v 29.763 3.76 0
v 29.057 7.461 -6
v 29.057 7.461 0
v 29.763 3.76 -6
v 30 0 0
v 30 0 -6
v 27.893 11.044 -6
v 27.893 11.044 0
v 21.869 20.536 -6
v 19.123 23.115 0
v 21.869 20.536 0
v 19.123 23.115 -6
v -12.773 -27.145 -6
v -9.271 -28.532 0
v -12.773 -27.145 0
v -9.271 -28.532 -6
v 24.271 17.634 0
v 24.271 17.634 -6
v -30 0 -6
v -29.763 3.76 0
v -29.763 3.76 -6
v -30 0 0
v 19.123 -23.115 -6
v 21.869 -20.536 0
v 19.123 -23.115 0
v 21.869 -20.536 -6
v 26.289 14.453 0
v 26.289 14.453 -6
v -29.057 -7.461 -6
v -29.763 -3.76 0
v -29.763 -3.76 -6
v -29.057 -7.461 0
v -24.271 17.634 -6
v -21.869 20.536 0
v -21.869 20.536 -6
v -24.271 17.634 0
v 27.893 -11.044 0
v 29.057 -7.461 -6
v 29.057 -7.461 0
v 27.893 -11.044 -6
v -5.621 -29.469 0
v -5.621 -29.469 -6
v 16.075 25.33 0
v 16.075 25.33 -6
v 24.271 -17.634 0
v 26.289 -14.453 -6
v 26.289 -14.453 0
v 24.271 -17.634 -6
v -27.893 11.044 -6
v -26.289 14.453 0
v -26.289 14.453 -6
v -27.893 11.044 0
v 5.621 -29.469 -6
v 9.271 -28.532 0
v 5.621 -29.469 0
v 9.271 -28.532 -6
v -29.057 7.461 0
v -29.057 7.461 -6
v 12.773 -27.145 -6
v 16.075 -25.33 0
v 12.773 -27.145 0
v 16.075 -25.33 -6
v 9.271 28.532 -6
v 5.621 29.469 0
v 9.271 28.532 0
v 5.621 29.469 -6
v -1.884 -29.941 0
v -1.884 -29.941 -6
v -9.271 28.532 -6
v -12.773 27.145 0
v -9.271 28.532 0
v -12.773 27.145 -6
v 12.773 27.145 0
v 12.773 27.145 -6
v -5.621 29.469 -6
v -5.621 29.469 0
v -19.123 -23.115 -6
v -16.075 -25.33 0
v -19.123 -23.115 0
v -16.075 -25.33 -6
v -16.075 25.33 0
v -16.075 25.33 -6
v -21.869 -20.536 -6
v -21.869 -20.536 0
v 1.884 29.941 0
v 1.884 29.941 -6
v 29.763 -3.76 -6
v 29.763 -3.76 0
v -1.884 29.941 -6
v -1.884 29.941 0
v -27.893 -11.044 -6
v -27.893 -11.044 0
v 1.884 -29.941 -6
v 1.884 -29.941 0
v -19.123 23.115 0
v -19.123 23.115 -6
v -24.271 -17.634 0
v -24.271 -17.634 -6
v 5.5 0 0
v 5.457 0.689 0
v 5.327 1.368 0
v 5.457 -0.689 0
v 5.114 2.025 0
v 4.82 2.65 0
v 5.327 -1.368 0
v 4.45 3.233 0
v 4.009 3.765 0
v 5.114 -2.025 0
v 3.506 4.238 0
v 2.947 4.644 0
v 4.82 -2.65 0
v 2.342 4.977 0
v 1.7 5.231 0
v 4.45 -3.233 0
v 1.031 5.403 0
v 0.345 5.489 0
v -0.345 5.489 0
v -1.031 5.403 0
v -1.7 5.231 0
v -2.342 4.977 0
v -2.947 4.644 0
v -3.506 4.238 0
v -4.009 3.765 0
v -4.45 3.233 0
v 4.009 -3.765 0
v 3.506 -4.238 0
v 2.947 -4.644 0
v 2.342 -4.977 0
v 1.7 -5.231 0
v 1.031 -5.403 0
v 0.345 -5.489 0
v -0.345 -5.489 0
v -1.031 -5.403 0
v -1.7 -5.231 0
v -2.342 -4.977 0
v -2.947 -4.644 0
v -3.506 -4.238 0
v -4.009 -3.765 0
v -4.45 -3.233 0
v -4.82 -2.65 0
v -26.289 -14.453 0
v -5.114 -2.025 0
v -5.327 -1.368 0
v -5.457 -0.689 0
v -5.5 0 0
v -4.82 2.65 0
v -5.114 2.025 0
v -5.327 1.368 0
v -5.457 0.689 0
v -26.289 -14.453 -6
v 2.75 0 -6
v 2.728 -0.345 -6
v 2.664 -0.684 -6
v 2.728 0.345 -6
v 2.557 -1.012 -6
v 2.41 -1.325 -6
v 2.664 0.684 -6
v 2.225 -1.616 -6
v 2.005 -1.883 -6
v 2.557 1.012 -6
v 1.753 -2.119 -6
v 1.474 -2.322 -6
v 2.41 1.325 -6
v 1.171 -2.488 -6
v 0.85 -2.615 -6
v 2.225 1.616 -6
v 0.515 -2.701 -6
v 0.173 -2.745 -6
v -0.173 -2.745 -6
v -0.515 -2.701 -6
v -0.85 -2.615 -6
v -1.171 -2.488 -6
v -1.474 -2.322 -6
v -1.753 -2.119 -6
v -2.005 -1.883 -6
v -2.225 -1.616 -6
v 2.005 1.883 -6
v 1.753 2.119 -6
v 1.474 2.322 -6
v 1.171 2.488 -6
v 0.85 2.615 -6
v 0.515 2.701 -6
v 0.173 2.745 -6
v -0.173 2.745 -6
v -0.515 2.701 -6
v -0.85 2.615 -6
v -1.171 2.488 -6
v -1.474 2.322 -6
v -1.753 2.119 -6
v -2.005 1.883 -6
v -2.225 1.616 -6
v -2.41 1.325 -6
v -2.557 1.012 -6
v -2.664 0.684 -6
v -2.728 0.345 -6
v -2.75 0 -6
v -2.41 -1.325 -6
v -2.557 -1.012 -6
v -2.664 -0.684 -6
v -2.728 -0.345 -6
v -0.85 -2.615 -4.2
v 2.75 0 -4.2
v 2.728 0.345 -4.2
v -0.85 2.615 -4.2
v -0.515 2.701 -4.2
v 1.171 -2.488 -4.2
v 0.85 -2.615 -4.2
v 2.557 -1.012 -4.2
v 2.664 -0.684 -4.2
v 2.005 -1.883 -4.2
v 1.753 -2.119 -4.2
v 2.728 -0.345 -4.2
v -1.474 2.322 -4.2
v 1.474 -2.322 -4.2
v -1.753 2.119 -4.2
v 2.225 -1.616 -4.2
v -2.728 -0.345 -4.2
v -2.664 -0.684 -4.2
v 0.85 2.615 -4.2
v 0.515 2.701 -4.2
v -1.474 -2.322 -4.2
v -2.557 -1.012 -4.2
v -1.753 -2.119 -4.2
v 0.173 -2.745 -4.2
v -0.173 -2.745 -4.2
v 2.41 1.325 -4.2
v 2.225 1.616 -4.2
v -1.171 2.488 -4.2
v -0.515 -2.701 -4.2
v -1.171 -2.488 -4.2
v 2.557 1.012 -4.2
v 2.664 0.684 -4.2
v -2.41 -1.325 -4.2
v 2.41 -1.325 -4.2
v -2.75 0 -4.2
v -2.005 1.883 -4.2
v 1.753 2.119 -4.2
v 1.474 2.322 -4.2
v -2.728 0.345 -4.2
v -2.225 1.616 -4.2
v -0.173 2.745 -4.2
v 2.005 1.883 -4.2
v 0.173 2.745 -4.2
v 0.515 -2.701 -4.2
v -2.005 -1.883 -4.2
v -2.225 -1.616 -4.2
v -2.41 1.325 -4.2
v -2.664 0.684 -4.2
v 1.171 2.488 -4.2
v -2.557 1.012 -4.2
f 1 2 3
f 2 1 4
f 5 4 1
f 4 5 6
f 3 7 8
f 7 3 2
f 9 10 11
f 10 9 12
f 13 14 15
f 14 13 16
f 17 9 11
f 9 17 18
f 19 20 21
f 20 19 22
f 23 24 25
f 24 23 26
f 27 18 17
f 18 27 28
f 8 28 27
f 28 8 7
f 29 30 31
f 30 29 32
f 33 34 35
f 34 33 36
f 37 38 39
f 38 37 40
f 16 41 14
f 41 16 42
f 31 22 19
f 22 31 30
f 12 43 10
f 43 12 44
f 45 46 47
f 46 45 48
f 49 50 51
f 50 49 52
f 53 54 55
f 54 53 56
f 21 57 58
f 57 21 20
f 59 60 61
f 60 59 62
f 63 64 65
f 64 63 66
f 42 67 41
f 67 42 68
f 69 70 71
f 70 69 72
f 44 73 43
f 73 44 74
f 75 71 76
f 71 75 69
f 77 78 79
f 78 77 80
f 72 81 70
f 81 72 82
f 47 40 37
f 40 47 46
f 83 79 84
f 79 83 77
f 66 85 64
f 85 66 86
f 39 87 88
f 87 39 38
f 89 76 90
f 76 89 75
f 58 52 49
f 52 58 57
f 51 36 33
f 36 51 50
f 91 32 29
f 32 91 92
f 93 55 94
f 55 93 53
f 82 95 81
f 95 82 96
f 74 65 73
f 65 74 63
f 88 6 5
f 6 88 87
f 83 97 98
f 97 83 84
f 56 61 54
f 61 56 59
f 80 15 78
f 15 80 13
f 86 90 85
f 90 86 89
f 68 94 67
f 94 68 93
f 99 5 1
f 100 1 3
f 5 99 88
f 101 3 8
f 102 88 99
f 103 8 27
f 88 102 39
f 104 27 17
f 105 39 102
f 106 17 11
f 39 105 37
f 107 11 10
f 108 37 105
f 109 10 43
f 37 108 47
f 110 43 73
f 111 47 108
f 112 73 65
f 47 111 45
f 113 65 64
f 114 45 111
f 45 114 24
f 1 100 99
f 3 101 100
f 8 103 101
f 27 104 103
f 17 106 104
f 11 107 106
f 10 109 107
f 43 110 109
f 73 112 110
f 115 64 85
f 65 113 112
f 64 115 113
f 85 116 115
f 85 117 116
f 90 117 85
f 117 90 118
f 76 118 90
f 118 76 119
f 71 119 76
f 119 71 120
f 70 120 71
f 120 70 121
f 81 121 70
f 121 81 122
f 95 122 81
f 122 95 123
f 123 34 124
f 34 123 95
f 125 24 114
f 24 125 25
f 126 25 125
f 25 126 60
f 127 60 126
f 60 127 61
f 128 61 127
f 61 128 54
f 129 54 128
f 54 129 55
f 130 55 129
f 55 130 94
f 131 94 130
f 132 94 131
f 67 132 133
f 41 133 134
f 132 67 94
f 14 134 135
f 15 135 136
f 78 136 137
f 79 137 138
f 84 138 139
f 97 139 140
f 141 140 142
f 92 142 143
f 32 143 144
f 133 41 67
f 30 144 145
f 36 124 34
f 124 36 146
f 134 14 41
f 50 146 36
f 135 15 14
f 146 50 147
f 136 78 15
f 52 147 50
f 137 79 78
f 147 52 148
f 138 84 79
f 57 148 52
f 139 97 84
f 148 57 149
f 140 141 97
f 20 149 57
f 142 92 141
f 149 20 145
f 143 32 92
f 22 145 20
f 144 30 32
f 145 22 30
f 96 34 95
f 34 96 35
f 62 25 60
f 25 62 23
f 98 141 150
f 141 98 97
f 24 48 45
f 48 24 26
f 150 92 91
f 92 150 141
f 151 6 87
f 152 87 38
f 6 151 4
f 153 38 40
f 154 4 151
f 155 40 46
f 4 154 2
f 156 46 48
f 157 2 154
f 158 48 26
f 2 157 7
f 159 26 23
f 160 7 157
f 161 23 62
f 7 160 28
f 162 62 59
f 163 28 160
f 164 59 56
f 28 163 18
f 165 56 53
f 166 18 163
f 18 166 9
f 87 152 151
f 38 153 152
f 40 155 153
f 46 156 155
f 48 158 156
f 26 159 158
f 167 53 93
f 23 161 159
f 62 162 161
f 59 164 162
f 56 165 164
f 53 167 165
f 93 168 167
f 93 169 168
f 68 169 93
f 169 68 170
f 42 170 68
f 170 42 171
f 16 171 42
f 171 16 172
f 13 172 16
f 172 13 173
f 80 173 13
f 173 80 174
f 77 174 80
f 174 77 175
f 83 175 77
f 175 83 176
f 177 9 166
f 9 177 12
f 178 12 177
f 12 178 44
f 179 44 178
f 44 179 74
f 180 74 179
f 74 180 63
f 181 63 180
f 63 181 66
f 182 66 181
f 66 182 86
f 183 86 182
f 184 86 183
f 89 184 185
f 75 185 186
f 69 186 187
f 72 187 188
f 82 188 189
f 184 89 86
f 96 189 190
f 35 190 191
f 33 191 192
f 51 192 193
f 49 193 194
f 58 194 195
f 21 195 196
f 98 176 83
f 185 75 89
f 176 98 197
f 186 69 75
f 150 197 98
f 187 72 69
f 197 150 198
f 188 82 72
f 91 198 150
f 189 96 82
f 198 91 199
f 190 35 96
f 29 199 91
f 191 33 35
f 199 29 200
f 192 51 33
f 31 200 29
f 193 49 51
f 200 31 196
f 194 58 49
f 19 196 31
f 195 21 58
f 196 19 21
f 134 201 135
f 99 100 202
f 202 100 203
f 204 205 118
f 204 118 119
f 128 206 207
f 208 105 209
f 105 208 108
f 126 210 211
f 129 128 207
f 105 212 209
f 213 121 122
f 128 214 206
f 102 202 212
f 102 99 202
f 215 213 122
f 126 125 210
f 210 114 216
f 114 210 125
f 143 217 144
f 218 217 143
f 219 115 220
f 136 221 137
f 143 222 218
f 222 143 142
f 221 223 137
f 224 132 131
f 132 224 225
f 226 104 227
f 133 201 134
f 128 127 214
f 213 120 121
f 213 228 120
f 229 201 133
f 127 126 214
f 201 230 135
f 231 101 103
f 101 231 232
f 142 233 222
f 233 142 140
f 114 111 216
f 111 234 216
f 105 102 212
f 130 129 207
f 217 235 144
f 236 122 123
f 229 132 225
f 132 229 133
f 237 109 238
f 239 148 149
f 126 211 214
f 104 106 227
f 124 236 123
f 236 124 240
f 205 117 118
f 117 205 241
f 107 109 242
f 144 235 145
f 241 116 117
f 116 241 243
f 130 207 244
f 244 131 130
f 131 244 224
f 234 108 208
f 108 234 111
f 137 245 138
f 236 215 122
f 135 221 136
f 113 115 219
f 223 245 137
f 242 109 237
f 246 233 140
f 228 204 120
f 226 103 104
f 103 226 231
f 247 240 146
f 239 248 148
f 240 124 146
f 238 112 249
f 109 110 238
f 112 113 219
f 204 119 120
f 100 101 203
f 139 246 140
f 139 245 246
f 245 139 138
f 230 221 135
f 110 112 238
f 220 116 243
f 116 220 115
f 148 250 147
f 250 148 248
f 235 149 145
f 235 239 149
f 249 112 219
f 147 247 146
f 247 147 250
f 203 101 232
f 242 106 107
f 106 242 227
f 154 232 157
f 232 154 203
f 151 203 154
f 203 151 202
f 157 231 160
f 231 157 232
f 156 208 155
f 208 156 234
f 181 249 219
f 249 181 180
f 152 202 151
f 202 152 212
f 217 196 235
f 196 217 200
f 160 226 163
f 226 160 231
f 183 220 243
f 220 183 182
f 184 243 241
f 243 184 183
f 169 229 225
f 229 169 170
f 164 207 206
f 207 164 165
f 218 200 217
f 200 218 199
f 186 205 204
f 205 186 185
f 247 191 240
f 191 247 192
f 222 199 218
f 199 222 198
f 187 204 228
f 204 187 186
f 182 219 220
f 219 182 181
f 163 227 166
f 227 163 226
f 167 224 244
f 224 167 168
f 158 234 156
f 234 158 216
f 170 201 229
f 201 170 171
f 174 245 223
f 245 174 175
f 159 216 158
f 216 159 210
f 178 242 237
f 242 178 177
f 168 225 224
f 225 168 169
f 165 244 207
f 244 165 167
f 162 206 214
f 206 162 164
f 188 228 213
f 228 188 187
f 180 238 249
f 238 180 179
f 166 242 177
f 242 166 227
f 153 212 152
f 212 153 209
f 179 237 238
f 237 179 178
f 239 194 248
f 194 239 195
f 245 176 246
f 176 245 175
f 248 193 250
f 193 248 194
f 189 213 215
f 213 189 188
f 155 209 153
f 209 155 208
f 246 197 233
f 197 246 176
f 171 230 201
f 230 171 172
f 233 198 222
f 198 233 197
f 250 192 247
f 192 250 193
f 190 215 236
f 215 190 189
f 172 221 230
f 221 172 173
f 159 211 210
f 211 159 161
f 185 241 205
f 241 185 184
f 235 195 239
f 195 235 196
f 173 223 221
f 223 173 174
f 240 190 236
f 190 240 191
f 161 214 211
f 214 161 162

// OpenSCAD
$fn = 50;


difference() {
	union() {
		translate(v = [0, 0, -6.0000000000]) {
			cylinder(h = 6, r = 30.0000000000);
		}
		translate(v = [0, 0, -6.0000000000]) {
			cylinder(h = 6, r = 2.8750000000);
		}
	}
	union() {
		translate(v = [0, 0, 0]) {
			rotate(a = [0, 0, 0]) {
				difference() {
					union() {
						translate(v = [0, 0, -6.0000000000]) {
							cylinder(h = 6, r = 2.2500000000);
						}
						translate(v = [0, 0, -4.2000000000]) {
							cylinder(h = 4.2000000000, r1 = 2.7500000000, r2 = 5.5000000000);
						}
						translate(v = [0, 0, -6.0000000000]) {
							cylinder(h = 6, r = 2.7500000000);
						}
						translate(v = [0, 0, -6.0000000000]) {
							cylinder(h = 6, r = 2.2500000000);
						}
					}
					union();
				}
			}
		}
	}
}
